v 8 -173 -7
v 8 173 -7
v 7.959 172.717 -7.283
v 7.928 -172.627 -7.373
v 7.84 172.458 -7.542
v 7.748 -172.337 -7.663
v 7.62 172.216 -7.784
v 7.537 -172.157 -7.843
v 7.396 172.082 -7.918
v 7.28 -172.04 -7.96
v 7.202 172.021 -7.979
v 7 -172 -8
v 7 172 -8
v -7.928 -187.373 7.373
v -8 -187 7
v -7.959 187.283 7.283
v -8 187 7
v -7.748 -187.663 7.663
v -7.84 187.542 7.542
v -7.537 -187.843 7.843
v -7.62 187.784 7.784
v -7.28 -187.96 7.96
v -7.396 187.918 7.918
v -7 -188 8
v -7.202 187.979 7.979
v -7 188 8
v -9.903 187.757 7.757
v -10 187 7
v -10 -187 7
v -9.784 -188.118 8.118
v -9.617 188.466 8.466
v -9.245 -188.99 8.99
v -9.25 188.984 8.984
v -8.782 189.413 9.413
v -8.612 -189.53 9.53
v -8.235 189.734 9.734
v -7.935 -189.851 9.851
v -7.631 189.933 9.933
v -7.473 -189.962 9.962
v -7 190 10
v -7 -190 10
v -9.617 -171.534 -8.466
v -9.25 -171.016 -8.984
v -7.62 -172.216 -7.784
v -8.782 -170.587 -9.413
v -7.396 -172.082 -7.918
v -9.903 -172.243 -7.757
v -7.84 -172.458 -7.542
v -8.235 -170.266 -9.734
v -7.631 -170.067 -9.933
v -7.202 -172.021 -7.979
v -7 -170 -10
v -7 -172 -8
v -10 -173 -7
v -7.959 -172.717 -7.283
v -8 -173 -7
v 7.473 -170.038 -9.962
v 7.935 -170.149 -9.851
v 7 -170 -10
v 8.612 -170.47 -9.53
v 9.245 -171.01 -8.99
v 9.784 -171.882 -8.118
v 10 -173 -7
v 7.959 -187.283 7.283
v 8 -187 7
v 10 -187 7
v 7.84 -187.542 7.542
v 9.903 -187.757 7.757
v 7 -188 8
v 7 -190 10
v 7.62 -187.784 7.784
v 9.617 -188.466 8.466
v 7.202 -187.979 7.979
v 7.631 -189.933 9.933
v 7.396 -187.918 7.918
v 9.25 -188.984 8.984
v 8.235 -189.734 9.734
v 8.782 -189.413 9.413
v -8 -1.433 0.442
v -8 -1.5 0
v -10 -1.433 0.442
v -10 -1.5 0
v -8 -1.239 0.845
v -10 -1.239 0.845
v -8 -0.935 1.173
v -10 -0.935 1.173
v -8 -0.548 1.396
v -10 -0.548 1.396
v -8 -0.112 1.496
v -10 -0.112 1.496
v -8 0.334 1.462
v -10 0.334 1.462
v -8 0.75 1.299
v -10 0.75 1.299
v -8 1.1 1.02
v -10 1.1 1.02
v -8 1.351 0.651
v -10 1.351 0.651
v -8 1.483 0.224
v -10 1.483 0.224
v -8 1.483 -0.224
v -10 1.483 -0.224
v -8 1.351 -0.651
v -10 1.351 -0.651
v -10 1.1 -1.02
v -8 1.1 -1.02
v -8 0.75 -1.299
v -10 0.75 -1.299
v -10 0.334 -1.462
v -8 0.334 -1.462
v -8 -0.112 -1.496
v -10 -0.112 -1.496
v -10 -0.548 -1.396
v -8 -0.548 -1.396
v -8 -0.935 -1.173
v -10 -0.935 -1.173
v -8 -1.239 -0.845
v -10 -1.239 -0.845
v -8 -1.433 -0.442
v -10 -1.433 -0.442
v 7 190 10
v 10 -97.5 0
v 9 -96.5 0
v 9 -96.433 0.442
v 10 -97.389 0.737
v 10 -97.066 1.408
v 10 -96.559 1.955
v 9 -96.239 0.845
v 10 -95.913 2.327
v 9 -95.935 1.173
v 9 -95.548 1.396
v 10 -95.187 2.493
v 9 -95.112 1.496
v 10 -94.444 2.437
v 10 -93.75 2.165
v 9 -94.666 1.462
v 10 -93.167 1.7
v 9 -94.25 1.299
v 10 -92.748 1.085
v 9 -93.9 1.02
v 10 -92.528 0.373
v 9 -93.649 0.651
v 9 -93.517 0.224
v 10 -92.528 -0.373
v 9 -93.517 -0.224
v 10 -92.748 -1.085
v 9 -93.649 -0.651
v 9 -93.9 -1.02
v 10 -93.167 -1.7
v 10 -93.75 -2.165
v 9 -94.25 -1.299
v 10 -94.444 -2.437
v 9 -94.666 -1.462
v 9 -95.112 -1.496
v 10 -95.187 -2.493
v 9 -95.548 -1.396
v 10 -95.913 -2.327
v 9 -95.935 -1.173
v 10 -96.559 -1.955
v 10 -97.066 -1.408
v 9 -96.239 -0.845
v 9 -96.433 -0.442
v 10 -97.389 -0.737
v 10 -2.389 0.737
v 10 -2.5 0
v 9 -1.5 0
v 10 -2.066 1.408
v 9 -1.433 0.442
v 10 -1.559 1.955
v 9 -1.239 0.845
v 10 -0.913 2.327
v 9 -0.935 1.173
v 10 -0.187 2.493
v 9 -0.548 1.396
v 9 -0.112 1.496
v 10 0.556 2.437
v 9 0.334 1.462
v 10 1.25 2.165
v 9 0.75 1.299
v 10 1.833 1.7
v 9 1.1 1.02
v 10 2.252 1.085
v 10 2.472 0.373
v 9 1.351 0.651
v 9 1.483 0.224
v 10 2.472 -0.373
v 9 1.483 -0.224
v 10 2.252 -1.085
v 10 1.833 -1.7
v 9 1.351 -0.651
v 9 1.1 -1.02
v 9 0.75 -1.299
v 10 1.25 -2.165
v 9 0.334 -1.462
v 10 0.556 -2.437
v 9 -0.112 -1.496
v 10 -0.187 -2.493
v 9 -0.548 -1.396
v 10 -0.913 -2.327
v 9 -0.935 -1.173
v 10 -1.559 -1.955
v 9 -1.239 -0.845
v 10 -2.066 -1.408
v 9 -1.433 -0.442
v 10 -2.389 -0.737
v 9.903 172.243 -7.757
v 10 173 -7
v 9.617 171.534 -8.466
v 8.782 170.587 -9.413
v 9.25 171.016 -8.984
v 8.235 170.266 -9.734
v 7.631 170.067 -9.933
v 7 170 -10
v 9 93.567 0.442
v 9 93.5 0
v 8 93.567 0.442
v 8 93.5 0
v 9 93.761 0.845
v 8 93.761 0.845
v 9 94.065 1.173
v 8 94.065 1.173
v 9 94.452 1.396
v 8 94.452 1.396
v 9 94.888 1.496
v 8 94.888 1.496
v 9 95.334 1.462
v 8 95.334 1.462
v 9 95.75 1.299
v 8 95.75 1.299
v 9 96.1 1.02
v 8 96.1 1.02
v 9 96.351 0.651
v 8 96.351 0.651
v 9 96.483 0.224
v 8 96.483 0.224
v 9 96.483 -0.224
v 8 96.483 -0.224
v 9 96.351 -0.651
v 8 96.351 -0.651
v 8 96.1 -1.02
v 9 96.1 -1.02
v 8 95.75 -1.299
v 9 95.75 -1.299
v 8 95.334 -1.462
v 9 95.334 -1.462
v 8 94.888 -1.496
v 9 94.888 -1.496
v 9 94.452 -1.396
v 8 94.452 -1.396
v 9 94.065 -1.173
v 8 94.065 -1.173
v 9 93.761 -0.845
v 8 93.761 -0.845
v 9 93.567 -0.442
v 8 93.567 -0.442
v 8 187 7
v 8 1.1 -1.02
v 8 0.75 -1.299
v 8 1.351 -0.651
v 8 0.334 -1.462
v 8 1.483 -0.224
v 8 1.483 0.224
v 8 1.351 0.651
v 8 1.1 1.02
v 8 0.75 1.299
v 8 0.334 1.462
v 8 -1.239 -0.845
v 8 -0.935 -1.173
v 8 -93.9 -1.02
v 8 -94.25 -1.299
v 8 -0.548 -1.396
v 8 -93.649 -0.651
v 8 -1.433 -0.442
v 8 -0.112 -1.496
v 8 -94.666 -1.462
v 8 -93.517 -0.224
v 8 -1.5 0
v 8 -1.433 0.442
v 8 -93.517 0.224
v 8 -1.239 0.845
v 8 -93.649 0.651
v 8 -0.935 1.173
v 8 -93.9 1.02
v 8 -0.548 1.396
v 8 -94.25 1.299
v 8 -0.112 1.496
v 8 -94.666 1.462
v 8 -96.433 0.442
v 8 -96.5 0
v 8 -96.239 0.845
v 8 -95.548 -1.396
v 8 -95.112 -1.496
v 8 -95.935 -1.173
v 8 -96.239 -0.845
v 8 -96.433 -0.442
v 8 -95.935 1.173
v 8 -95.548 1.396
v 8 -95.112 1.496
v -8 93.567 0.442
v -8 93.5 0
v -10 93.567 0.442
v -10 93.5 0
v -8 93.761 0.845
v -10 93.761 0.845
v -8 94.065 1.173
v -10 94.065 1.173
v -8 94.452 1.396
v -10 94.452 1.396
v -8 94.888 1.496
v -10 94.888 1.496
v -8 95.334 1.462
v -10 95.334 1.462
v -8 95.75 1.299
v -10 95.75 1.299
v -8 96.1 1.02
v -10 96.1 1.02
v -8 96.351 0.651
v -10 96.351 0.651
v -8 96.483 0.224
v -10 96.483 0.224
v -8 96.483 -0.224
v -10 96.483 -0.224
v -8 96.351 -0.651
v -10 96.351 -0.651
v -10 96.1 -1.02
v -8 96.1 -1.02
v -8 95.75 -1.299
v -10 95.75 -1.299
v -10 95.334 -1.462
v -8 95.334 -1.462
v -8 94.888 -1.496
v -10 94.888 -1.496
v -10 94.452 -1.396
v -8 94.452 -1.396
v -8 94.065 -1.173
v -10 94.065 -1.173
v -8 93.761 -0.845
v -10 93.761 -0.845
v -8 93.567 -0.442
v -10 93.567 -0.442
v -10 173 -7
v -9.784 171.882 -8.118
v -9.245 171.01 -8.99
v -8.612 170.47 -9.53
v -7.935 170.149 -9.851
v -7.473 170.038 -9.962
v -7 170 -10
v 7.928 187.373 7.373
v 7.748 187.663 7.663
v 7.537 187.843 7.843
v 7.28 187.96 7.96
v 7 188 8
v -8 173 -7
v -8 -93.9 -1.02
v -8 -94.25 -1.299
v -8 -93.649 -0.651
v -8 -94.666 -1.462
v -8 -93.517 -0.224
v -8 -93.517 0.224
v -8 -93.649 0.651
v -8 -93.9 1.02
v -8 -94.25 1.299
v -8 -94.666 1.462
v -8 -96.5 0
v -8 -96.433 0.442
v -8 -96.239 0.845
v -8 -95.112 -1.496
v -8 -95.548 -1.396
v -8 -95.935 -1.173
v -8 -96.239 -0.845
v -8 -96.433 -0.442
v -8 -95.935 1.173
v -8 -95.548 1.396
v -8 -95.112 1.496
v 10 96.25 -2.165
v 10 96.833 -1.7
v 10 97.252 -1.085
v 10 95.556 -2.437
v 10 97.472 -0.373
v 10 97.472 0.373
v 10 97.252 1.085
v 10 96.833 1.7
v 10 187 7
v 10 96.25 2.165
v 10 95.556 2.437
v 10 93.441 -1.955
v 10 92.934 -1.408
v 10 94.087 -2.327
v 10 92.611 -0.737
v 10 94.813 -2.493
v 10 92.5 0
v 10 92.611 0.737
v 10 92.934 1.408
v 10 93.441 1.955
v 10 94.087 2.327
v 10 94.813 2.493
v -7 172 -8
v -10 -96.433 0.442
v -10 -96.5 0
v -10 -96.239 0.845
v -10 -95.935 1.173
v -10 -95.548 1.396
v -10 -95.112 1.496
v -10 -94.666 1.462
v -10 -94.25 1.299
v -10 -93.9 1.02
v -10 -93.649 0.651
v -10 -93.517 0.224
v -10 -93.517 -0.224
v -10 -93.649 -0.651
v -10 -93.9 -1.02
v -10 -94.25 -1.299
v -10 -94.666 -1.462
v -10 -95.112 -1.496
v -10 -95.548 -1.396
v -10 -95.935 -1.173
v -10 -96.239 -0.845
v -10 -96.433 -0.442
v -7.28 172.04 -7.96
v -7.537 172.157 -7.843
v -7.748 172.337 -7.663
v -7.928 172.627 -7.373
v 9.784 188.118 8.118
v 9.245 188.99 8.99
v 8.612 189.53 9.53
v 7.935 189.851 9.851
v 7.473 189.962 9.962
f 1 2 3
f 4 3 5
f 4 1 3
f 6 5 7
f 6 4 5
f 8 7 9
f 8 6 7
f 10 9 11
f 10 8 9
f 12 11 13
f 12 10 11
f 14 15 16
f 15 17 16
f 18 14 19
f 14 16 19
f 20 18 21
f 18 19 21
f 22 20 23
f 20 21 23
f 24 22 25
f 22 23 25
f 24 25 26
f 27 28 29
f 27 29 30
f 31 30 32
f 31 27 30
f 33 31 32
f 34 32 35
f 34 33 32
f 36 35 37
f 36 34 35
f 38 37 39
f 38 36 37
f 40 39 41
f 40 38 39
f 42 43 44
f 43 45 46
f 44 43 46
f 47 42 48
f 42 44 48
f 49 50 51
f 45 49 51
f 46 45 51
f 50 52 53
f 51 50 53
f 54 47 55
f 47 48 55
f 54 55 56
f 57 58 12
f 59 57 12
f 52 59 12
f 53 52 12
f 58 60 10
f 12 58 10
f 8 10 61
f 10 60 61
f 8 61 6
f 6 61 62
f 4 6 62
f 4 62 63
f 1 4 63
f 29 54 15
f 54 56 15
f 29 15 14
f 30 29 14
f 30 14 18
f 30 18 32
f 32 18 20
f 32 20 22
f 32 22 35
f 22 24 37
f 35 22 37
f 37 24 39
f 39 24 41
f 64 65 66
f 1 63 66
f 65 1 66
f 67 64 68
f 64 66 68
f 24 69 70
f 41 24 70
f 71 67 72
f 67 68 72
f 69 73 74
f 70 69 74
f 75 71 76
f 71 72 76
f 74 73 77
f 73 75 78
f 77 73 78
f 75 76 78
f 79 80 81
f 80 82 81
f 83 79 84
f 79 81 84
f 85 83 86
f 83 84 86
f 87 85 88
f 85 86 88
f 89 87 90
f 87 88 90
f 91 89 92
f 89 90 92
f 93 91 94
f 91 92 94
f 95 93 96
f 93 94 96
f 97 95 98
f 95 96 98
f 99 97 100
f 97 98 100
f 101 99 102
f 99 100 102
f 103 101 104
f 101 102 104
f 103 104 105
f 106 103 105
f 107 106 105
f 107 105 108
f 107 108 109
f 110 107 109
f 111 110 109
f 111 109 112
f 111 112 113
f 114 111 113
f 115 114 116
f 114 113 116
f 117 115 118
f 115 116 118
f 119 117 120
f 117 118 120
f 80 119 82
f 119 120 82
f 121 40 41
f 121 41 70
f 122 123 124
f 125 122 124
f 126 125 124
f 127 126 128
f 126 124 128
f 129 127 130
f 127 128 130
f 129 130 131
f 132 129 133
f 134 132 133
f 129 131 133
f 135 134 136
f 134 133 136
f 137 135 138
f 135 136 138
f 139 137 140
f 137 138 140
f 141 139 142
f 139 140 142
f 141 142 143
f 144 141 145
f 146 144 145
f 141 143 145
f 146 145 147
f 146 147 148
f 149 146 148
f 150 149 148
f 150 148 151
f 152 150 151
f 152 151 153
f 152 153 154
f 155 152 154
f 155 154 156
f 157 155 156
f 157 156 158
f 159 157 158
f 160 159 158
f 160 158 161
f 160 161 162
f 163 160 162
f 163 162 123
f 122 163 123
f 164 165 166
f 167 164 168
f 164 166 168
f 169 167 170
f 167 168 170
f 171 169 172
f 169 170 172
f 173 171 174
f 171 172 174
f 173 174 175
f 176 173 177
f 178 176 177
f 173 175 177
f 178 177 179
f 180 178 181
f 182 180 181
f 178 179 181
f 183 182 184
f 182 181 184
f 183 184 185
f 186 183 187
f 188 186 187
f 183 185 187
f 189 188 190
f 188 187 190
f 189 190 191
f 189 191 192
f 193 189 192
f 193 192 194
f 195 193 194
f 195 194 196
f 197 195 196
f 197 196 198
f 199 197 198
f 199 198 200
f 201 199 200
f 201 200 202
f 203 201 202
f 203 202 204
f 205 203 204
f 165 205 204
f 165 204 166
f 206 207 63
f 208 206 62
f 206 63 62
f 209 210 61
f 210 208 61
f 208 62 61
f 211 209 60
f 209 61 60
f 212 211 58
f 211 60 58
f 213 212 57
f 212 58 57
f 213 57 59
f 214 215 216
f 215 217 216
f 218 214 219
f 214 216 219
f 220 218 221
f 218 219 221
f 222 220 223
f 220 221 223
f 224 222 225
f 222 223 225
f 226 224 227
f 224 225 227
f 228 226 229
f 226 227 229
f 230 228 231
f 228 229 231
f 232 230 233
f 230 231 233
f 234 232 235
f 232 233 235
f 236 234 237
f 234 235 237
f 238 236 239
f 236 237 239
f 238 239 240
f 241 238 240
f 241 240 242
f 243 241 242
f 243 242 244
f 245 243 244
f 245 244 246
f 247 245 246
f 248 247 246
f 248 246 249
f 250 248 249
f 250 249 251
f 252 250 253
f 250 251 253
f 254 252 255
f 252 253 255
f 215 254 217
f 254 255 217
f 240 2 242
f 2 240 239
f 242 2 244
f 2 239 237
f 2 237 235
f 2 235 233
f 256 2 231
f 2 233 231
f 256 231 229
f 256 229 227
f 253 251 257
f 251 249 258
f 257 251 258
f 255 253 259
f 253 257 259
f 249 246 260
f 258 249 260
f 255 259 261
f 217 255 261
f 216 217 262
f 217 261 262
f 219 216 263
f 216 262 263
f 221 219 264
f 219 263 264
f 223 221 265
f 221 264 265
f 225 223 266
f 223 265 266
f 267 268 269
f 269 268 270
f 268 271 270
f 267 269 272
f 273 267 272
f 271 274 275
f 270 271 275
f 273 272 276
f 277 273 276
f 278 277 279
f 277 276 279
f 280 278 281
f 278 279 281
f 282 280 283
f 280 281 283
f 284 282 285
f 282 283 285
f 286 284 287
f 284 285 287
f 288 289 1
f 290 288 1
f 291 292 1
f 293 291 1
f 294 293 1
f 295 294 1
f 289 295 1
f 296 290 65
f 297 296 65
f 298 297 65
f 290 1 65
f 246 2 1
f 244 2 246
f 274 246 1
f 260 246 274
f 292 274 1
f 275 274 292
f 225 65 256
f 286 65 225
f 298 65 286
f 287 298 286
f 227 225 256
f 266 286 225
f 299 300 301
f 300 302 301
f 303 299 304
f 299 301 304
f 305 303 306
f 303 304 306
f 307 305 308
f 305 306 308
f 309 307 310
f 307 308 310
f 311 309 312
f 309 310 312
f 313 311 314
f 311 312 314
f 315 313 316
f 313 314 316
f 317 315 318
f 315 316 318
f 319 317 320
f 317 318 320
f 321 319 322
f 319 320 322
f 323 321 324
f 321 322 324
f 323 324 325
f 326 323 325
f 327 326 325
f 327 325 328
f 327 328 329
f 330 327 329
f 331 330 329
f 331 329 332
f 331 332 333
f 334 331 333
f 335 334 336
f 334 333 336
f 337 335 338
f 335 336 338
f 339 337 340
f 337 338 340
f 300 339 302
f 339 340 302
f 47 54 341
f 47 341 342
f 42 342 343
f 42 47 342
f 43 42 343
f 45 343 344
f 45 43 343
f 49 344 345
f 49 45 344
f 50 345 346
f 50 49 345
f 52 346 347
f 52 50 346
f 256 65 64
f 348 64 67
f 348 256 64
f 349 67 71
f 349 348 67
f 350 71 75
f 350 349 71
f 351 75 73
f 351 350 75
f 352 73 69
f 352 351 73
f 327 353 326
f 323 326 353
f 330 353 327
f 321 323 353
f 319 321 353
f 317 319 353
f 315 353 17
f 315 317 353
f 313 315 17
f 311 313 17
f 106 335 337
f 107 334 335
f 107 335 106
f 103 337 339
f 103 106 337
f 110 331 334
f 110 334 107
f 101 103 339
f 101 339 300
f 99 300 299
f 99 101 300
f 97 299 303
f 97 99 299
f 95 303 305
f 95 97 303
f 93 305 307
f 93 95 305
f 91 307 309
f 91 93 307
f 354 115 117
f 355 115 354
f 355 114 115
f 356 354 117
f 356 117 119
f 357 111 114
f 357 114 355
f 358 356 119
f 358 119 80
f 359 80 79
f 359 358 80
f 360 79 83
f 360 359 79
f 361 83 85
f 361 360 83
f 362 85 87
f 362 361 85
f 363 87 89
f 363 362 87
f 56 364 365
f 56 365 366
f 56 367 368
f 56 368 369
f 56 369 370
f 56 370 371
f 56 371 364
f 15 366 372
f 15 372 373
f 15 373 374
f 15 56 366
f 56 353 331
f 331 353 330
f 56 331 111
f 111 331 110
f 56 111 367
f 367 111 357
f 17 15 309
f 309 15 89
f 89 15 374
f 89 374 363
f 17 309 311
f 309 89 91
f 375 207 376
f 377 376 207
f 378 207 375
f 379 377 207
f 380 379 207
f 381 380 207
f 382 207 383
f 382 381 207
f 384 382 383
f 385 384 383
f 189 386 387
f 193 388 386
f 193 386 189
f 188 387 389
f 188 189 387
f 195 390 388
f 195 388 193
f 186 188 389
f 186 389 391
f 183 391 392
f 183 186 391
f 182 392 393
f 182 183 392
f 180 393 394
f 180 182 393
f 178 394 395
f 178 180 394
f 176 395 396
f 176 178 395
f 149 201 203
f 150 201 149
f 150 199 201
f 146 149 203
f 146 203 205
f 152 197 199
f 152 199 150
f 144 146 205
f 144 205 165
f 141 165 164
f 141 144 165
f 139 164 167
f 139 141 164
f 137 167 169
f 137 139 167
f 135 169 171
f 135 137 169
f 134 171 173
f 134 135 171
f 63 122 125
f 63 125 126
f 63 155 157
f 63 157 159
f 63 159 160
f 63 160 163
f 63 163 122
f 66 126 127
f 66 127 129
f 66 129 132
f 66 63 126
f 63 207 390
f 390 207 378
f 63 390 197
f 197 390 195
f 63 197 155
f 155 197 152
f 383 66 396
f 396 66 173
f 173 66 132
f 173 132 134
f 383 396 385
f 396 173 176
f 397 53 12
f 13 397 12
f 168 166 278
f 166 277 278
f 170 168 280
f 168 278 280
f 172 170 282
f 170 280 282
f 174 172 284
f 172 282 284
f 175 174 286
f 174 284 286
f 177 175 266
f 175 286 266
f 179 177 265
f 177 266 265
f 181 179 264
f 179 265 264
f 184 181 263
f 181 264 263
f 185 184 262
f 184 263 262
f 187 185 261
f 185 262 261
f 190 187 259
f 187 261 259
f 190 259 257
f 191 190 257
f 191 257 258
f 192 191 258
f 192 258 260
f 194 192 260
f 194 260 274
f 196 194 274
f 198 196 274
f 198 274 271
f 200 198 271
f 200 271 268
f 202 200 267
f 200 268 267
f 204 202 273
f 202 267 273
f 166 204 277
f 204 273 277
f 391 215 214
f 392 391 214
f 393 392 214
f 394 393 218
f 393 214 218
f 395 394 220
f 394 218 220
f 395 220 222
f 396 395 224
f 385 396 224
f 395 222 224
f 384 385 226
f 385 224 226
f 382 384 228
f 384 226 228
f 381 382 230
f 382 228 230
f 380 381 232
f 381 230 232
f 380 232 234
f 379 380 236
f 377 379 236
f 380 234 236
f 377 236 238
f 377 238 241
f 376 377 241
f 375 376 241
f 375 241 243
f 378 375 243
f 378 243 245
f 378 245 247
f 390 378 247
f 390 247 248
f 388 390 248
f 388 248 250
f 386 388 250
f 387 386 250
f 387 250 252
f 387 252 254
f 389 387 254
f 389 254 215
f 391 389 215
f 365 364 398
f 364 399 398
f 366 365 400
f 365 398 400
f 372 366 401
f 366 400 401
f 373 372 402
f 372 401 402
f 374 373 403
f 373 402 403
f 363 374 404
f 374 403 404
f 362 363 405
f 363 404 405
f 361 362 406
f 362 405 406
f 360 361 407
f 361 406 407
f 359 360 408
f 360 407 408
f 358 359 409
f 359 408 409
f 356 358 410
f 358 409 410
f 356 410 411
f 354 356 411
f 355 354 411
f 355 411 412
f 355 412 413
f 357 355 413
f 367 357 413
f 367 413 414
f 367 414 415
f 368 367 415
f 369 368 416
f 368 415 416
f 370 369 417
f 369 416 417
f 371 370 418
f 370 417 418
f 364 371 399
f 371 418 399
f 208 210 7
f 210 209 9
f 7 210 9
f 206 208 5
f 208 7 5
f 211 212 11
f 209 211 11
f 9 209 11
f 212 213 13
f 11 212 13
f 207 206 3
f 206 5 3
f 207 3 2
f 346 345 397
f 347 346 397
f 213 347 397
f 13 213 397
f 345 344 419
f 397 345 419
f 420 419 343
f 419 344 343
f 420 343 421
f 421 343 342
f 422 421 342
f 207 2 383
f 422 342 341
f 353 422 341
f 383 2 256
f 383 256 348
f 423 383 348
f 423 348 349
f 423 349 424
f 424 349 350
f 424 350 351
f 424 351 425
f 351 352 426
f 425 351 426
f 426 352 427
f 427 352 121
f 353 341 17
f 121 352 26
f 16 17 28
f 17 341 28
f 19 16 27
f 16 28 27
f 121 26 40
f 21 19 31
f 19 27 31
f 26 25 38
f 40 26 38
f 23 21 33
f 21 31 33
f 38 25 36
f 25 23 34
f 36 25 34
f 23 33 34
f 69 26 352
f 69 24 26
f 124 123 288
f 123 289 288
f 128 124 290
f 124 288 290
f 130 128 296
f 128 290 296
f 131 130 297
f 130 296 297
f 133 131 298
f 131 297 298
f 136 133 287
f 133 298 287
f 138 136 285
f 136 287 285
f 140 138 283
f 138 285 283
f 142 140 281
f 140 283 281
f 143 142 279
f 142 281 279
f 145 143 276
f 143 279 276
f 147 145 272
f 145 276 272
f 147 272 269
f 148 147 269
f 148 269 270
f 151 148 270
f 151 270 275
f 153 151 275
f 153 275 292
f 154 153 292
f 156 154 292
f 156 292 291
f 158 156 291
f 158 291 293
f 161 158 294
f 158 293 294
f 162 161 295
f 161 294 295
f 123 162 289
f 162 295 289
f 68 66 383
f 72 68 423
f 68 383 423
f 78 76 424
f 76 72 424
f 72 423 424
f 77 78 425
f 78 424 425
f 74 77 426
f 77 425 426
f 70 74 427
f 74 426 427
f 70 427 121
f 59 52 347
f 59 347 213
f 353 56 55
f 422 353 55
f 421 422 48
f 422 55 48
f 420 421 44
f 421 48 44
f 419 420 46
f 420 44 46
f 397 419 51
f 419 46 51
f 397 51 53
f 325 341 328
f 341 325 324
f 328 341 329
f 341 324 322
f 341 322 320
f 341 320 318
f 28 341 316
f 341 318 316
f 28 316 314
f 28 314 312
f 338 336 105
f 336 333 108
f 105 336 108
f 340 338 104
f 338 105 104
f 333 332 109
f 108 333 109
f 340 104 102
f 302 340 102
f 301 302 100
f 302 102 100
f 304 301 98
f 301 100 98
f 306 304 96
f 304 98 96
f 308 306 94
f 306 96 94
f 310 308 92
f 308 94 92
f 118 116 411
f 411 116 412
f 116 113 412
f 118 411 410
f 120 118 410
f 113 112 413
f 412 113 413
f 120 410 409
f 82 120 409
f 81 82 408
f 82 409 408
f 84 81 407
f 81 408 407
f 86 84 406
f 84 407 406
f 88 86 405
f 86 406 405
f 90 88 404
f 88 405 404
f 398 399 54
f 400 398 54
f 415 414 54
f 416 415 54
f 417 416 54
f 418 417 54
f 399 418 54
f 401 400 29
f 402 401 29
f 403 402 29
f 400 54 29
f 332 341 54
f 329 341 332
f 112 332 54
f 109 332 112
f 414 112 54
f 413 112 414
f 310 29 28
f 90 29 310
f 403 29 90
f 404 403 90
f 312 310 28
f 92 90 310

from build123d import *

# Parameters (mm, degrees)
F2_W            = 20
F2_H            = 20
F3_DEPTH        = 190
F4_R            = 3
F5_T            = -2
F7_DEPTH        = 20.001
F9_DEPTH        = 20.001
F11_D           = 3
F11_CSINK_D     = 5
F11_CSINK_ANGLE = 90


with BuildPart() as f3:
    # F2 (on Front) → F3 (new body, symmetric)
    with BuildSketch(Plane.XZ):
        Rectangle(F2_W, F2_H)
    extrude(amount=F3_DEPTH, both=True)

    # F4
    f4_edges = [f3.edges().sort_by_distance(p)[0] for p in [
        (10, 0, 10),
        (-10, 0, 10),
        (10, 0, -10),
        (-10, 0, -10),
    ]]
    fillet(f4_edges, radius=F4_R)

    # F5
    f5_openings = [f3.faces().sort_by_distance(p)[0] for p in [
        (0, -190, 0),
        (0, 190, 0),
    ]]
    offset(amount=F5_T, openings=f5_openings)

    # F6 (on face) → F7 (cut, through all)
    with BuildSketch(Plane(origin=(-10, 0, 0), x_dir=(0, -1, 0), z_dir=(-1, 0, 0))):
        Polygon((-190, 10), (-190, -10), (-170, -10), align=None)
    extrude(amount=-F7_DEPTH, mode=Mode.SUBTRACT)

    # F8 (on face) → F9 (cut, through all)
    with BuildSketch(Plane.YZ.offset(10)):
        Polygon((-190, -10), (-170, -10), (-190, 10), align=None)
    extrude(amount=-F9_DEPTH, mode=Mode.SUBTRACT)

    # F11 (through all)
    with Locations(Plane.YZ.offset(10)):
        with Locations((95, 0), (0, 0), (-95, 0)):
            CounterSinkHole(F11_D / 2, F11_CSINK_D / 2, counter_sink_angle=F11_CSINK_ANGLE)


solid = f3.part
